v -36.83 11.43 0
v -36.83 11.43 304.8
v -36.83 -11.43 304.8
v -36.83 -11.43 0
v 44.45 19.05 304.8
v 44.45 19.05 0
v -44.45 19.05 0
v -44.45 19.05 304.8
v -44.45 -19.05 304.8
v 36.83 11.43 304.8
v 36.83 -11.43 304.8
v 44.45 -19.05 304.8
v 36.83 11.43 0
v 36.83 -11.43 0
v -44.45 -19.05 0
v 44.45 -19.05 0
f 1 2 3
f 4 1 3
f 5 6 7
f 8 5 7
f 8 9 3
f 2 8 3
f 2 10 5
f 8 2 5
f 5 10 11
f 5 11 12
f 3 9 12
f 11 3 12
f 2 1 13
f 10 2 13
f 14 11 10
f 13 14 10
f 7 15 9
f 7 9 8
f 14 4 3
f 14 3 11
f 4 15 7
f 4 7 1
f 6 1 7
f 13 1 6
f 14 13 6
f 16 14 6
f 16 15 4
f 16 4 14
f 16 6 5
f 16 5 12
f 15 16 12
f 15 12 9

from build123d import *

# Parameters (mm, degrees)
F1_DEPTH = 304.8


with BuildPart() as f1:
    # F0 (on Top) → F1 (new body)
    with BuildSketch(Plane.XY):
        Polygon((-44.45, 19.05), (-44.45, 0), (-36.83, 0), (-36.83, 11.43), (36.83, 11.43), (36.83, 0), (44.45, 0), (44.45, 19.05), align=None)
    extrude(amount=F1_DEPTH)

    # F2: F1 across plane


with BuildPart() as f1_1:
    add(f1.part)
    add(f1.part.mirror(Plane.XZ))


solid = f1_1.part
